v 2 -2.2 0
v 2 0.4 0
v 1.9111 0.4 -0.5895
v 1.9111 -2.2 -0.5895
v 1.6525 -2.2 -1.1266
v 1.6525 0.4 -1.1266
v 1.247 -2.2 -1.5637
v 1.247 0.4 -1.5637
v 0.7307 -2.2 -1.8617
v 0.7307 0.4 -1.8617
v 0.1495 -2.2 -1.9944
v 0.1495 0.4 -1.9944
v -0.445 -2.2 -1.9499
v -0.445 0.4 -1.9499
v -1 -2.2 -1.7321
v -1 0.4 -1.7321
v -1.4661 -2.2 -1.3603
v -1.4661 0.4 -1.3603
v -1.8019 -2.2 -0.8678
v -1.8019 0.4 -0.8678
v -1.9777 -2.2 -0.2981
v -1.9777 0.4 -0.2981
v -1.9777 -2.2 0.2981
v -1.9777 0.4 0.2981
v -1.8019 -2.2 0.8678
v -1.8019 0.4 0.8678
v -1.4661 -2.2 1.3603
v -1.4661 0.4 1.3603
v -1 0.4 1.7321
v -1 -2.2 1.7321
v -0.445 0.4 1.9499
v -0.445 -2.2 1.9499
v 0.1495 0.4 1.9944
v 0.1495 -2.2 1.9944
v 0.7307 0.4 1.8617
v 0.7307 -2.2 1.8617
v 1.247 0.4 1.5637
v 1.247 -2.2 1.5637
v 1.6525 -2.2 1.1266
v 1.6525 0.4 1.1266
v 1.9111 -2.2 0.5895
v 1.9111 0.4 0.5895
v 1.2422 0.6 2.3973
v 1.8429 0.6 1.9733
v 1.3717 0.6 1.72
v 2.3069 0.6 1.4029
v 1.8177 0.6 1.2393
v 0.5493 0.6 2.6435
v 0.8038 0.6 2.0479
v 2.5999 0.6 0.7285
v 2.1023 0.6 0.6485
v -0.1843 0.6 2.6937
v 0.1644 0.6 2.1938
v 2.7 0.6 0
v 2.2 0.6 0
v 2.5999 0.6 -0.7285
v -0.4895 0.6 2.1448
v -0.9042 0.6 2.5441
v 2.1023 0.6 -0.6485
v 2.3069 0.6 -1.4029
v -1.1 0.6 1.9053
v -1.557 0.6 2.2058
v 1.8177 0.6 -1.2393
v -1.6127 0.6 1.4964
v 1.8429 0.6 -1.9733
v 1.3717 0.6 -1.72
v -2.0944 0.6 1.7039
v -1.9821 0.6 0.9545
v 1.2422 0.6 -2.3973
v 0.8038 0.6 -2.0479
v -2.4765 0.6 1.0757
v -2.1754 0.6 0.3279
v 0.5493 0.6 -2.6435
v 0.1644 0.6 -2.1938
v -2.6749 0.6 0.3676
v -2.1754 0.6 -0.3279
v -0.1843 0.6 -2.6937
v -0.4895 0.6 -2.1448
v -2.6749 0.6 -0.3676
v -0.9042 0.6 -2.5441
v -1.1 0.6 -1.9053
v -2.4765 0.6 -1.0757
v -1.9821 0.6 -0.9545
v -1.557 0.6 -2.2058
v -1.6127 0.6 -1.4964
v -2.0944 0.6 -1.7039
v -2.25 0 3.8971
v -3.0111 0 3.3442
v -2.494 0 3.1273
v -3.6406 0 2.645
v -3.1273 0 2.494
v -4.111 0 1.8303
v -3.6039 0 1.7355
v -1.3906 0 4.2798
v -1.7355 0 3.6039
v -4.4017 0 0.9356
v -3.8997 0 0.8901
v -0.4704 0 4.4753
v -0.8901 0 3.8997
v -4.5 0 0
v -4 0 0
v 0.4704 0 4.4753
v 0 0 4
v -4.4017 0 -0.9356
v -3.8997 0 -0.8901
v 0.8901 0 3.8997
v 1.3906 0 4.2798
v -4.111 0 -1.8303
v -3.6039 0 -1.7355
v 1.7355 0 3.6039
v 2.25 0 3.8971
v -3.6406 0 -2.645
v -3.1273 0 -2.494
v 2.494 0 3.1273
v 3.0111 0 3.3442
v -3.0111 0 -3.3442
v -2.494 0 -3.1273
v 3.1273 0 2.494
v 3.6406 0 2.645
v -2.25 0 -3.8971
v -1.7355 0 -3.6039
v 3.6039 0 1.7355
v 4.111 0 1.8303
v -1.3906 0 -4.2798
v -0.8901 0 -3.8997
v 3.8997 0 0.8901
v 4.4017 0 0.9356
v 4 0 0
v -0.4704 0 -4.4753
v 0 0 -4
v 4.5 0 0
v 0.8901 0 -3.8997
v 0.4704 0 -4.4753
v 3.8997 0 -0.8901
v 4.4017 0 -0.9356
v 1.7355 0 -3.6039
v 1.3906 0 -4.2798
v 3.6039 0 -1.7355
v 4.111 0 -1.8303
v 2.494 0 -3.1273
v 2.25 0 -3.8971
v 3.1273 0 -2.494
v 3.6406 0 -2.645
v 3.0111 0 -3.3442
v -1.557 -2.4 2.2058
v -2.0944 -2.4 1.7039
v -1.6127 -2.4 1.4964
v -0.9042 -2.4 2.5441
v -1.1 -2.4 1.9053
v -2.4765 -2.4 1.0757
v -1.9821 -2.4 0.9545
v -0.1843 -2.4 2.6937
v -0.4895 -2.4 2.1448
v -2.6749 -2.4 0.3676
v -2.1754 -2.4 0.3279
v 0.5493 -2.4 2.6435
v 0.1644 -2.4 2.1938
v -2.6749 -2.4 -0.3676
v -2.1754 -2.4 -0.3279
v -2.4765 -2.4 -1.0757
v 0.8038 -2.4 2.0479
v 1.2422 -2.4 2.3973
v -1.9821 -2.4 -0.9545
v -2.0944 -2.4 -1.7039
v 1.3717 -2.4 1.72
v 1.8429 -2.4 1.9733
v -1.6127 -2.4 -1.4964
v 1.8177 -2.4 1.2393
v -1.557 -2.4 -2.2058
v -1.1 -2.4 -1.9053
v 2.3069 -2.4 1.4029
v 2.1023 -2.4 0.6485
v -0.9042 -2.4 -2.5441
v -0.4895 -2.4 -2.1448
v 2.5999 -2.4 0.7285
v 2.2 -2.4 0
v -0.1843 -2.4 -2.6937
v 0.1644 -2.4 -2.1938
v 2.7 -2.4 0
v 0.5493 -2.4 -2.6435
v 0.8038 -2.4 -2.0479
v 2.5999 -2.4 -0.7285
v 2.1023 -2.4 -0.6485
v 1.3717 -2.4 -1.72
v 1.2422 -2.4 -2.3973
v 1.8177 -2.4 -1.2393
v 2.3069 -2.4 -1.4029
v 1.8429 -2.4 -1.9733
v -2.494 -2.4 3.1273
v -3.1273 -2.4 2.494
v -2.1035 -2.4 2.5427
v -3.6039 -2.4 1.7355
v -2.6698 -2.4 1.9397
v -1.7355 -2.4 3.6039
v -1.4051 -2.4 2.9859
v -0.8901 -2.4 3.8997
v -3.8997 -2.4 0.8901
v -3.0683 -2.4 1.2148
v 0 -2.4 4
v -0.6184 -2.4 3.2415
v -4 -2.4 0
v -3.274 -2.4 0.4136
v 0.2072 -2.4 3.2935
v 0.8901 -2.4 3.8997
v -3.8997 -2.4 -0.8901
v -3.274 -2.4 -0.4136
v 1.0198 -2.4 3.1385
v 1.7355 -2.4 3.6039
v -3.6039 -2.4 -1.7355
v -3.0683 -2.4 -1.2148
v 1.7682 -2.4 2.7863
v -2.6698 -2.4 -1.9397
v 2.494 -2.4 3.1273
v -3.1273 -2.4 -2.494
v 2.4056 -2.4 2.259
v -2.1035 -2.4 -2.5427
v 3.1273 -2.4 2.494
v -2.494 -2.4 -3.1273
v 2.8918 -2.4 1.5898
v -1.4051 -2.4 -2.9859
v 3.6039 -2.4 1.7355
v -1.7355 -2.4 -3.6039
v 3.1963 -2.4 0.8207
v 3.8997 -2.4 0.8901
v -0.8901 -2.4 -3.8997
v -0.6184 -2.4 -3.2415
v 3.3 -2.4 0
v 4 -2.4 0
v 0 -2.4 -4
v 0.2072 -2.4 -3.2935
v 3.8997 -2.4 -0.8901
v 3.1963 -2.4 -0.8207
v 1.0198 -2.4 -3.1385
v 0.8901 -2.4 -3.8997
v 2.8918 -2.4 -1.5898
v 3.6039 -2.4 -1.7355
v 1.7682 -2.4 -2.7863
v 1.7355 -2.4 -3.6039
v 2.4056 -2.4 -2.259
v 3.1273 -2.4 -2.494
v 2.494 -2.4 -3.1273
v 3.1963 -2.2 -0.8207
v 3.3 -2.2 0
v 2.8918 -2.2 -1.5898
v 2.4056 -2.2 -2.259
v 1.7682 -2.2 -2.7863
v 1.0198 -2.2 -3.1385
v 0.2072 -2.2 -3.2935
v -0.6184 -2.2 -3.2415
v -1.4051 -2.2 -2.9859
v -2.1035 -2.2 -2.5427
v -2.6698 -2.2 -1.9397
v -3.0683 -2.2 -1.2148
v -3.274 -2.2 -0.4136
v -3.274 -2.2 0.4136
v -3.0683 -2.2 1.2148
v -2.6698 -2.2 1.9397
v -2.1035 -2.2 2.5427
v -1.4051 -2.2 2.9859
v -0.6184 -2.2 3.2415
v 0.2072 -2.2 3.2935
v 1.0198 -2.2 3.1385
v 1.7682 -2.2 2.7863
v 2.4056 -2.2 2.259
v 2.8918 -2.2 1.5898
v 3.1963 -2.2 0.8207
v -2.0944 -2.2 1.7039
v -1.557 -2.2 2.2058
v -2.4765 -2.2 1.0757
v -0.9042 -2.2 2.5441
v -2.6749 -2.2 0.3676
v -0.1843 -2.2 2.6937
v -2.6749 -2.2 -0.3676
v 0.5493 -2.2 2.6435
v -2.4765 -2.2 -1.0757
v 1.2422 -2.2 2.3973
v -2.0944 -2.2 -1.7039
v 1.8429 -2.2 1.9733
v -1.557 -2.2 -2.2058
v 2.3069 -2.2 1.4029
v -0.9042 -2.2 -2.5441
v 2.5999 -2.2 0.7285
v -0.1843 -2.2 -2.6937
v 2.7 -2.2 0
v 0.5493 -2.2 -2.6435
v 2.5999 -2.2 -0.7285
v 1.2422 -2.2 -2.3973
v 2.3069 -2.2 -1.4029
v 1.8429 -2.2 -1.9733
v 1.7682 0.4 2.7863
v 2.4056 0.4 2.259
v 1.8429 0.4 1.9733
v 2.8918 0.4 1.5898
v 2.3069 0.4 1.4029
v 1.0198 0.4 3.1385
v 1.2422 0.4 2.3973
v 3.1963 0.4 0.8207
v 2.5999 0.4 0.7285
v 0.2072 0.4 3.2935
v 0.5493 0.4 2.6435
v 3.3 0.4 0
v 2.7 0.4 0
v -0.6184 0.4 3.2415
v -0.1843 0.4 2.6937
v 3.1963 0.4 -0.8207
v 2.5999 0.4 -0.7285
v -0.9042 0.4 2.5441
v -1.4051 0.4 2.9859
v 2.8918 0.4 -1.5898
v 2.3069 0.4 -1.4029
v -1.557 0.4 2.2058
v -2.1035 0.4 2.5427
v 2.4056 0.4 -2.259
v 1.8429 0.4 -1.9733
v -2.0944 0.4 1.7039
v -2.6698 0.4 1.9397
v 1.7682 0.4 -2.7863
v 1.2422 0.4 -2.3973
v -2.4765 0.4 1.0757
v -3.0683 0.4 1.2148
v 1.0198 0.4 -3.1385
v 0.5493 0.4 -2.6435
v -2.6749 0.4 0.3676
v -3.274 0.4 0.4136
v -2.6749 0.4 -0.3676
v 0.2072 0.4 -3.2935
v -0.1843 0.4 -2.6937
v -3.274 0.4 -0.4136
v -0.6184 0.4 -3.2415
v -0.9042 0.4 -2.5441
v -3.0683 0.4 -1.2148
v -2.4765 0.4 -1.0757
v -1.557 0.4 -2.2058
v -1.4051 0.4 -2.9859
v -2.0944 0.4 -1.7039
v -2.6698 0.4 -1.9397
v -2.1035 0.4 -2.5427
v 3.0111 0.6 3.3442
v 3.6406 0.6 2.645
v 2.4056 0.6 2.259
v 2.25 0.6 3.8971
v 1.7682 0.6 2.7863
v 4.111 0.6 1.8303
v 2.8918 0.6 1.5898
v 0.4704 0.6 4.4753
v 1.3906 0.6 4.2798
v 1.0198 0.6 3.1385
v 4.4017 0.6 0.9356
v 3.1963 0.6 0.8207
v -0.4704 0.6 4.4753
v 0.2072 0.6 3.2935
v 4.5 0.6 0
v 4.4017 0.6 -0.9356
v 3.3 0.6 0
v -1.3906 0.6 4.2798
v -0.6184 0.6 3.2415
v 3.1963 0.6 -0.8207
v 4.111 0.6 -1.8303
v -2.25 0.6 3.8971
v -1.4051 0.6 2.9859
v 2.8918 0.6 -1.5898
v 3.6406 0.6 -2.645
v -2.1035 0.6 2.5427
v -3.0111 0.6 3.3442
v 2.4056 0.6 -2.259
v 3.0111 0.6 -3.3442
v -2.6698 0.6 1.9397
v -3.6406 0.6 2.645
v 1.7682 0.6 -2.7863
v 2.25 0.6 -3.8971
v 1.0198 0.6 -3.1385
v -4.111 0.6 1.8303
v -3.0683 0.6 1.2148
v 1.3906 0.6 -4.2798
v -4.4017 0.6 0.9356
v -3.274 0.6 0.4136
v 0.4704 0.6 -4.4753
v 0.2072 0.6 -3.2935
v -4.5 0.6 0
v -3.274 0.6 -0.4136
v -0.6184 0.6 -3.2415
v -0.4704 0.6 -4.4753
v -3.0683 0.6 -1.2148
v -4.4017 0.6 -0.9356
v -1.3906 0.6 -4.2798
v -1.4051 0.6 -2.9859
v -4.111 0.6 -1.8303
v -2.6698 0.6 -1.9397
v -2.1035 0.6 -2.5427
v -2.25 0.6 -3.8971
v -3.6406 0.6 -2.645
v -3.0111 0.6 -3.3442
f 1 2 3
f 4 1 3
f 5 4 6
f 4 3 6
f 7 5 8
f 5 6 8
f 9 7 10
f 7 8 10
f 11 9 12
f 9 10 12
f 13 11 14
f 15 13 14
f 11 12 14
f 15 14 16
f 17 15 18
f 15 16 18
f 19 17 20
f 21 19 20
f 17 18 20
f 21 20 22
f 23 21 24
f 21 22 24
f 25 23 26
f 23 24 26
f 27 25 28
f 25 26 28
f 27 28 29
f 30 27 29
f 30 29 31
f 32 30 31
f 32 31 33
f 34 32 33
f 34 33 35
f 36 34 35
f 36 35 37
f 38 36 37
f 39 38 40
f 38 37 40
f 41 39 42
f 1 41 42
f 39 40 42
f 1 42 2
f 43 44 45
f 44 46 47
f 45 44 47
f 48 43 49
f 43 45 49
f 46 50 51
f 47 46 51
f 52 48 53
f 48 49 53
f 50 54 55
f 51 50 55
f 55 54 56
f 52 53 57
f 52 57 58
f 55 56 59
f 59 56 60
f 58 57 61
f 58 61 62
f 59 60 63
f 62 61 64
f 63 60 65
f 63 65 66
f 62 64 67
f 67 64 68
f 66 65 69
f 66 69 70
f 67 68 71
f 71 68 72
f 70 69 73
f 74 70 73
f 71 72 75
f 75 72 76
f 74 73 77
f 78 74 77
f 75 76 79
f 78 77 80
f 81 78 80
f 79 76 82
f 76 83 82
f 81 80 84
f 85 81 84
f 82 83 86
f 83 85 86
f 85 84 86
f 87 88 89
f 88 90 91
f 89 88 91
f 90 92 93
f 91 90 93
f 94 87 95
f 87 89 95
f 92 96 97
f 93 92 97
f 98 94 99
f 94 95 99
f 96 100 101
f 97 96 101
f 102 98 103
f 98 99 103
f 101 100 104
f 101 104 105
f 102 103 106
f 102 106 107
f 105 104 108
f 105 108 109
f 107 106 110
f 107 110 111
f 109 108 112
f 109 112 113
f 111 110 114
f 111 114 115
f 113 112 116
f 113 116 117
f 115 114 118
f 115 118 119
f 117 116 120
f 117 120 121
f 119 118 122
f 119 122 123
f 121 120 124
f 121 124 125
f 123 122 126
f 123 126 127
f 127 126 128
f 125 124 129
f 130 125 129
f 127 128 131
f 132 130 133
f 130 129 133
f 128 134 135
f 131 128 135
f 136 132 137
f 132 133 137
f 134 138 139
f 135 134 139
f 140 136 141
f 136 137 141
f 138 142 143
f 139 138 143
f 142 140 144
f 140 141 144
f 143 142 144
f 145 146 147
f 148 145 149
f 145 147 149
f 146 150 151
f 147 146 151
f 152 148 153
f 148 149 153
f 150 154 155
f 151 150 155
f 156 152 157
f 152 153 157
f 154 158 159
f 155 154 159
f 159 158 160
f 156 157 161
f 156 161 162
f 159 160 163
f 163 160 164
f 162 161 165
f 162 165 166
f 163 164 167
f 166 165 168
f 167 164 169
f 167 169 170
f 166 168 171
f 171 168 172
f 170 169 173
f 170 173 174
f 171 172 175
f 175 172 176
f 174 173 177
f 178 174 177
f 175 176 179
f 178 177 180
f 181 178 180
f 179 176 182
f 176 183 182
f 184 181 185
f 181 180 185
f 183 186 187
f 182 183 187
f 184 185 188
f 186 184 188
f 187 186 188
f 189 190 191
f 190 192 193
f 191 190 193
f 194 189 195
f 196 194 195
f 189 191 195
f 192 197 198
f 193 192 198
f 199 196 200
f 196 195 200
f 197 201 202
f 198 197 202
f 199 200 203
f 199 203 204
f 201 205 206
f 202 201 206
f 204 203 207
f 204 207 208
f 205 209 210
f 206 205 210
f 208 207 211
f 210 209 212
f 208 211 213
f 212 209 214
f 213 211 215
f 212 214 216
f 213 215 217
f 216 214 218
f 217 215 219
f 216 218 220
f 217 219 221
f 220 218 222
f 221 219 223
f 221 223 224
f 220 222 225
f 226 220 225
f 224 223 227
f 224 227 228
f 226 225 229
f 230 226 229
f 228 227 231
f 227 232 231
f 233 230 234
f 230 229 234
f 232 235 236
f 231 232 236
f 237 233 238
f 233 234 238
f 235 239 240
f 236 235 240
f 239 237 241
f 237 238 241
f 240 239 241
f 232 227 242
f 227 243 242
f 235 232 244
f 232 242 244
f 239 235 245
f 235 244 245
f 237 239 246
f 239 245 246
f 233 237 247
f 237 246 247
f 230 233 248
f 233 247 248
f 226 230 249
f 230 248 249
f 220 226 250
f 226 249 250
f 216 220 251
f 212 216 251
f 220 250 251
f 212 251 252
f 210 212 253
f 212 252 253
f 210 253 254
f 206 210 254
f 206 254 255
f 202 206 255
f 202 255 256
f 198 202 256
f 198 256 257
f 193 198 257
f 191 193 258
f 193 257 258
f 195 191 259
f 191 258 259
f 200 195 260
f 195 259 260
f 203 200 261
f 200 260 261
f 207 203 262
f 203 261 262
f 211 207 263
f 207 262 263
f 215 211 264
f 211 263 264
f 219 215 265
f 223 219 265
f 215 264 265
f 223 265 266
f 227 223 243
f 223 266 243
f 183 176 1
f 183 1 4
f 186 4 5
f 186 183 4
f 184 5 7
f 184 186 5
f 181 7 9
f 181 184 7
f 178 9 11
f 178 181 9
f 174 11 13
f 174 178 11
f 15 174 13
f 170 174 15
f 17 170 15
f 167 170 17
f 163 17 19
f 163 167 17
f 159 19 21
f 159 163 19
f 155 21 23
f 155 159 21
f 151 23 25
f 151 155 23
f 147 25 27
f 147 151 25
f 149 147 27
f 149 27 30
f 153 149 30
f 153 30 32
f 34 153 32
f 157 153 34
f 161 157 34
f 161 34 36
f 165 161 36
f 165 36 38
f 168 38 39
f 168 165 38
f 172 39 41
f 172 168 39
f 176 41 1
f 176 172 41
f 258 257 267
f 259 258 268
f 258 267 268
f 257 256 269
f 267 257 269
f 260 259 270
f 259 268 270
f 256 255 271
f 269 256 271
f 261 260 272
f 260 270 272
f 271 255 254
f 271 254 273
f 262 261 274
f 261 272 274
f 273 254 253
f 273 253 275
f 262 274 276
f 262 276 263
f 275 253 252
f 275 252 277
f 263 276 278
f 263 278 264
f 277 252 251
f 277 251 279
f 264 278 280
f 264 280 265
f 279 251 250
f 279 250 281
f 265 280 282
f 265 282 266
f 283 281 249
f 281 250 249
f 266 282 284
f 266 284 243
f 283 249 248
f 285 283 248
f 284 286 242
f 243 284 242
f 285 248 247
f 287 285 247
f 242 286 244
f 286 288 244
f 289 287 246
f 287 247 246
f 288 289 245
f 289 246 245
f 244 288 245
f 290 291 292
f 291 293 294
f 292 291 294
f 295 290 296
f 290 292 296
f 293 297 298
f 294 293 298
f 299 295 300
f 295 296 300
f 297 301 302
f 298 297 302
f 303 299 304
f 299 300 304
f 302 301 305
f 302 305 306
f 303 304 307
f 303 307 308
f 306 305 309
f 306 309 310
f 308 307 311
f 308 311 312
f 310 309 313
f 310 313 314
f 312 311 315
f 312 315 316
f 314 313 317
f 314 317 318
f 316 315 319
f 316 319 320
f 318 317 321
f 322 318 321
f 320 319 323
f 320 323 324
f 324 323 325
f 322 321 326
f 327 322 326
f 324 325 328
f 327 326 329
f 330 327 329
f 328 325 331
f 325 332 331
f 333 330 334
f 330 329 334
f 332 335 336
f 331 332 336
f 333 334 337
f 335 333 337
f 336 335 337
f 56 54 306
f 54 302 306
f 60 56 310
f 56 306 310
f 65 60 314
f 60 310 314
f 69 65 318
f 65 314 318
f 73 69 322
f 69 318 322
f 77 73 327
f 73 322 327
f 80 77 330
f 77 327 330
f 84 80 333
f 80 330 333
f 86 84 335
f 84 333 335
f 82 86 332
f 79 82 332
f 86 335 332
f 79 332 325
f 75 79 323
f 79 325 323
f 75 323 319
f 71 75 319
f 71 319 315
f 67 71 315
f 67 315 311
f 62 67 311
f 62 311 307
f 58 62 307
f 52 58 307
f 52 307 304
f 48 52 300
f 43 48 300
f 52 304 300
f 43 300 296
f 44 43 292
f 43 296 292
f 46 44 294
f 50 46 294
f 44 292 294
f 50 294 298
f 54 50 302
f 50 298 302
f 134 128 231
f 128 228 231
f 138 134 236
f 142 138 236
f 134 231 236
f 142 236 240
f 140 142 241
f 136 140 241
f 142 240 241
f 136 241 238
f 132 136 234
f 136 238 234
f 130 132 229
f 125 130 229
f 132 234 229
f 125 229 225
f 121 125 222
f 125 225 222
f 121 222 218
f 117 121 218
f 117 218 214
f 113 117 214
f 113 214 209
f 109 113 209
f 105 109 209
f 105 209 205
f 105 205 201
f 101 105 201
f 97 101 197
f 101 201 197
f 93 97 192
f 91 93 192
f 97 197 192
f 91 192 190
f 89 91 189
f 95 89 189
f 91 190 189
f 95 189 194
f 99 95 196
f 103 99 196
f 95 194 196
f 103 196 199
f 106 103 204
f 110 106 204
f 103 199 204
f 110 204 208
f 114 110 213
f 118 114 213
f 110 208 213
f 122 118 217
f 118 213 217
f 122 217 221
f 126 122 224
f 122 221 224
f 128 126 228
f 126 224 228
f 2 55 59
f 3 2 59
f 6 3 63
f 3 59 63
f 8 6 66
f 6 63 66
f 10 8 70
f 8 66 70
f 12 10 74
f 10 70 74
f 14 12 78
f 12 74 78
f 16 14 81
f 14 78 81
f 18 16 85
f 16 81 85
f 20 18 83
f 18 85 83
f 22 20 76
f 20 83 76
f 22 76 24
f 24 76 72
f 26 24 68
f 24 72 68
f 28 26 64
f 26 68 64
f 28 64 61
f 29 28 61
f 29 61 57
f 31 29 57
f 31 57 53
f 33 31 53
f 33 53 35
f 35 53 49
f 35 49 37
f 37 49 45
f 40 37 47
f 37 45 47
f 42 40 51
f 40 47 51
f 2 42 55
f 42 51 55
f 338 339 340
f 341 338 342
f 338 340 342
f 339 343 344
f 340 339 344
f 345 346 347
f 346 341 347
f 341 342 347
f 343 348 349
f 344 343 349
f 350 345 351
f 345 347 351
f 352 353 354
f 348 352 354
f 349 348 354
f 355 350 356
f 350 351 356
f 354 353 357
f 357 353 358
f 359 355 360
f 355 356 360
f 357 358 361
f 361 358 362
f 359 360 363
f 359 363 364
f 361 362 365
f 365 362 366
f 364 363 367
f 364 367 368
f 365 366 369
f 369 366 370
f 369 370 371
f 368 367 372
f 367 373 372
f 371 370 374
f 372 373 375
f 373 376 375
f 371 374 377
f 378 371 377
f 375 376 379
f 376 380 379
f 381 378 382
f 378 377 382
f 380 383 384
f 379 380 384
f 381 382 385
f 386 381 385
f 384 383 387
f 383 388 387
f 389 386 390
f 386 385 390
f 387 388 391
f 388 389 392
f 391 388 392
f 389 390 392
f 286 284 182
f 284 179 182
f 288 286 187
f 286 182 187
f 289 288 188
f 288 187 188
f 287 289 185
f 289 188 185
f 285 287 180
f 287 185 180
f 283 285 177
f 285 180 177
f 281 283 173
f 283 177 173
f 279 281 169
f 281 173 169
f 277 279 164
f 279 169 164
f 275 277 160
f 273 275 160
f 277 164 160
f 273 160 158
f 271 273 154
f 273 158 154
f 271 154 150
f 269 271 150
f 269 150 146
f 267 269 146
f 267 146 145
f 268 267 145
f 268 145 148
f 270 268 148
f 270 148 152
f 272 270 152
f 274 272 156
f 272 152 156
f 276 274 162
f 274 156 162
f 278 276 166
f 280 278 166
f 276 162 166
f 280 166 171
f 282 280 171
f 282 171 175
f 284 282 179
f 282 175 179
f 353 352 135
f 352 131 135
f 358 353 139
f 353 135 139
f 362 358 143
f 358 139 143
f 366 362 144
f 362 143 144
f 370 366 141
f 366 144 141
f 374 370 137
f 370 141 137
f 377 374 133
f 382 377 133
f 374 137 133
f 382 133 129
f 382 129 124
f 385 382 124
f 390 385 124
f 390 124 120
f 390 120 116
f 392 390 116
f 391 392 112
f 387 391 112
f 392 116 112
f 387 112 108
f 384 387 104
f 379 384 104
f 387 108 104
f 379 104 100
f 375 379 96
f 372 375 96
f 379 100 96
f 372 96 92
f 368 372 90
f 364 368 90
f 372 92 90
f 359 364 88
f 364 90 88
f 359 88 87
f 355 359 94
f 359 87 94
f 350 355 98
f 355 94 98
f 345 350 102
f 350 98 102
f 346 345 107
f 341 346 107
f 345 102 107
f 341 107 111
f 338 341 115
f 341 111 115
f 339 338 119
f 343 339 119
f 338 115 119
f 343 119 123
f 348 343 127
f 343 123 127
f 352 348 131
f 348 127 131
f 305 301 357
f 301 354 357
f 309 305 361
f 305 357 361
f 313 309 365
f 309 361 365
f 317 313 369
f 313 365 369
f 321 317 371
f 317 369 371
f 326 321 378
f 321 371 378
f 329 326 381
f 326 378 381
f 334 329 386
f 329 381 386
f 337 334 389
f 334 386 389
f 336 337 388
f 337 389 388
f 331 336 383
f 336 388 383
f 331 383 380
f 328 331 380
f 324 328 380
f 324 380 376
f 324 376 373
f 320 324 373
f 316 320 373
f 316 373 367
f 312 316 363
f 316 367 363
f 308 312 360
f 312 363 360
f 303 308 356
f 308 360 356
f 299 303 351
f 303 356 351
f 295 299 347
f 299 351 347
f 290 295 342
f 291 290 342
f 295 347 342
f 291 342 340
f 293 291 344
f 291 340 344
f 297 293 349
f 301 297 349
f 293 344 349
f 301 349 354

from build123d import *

# Parameters (mm, degrees)
CHAMFER1_SIZE = 0.2


with BuildPart() as part:
    # Sketch1 → Revolve1 (revolve)
    with BuildSketch(Plane.XY):
        Polygon((2, -2.4), (2, 0.6), (2.7, 0.6), (2.7, 0.4), (3.3, 0.4), (3.3, 0.6), (4.5, 0.6), (4.5, 0), (4, 0), (4, -2.4), (3.3, -2.4), (3.3, -2.2), (2.7, -2.2), (2.7, -2.4), align=None)
    revolve(axis=Axis((0, 0, 0), (0, 1, 0)))

    # Chamfer1
    chamfer1_edges = [part.edges().sort_by_distance(p)[0] for p in [
        (-2, -2.4, 0),
        (-2, 0.6, 0),
    ]]
    chamfer(chamfer1_edges, length=CHAMFER1_SIZE)


solid = part.part
